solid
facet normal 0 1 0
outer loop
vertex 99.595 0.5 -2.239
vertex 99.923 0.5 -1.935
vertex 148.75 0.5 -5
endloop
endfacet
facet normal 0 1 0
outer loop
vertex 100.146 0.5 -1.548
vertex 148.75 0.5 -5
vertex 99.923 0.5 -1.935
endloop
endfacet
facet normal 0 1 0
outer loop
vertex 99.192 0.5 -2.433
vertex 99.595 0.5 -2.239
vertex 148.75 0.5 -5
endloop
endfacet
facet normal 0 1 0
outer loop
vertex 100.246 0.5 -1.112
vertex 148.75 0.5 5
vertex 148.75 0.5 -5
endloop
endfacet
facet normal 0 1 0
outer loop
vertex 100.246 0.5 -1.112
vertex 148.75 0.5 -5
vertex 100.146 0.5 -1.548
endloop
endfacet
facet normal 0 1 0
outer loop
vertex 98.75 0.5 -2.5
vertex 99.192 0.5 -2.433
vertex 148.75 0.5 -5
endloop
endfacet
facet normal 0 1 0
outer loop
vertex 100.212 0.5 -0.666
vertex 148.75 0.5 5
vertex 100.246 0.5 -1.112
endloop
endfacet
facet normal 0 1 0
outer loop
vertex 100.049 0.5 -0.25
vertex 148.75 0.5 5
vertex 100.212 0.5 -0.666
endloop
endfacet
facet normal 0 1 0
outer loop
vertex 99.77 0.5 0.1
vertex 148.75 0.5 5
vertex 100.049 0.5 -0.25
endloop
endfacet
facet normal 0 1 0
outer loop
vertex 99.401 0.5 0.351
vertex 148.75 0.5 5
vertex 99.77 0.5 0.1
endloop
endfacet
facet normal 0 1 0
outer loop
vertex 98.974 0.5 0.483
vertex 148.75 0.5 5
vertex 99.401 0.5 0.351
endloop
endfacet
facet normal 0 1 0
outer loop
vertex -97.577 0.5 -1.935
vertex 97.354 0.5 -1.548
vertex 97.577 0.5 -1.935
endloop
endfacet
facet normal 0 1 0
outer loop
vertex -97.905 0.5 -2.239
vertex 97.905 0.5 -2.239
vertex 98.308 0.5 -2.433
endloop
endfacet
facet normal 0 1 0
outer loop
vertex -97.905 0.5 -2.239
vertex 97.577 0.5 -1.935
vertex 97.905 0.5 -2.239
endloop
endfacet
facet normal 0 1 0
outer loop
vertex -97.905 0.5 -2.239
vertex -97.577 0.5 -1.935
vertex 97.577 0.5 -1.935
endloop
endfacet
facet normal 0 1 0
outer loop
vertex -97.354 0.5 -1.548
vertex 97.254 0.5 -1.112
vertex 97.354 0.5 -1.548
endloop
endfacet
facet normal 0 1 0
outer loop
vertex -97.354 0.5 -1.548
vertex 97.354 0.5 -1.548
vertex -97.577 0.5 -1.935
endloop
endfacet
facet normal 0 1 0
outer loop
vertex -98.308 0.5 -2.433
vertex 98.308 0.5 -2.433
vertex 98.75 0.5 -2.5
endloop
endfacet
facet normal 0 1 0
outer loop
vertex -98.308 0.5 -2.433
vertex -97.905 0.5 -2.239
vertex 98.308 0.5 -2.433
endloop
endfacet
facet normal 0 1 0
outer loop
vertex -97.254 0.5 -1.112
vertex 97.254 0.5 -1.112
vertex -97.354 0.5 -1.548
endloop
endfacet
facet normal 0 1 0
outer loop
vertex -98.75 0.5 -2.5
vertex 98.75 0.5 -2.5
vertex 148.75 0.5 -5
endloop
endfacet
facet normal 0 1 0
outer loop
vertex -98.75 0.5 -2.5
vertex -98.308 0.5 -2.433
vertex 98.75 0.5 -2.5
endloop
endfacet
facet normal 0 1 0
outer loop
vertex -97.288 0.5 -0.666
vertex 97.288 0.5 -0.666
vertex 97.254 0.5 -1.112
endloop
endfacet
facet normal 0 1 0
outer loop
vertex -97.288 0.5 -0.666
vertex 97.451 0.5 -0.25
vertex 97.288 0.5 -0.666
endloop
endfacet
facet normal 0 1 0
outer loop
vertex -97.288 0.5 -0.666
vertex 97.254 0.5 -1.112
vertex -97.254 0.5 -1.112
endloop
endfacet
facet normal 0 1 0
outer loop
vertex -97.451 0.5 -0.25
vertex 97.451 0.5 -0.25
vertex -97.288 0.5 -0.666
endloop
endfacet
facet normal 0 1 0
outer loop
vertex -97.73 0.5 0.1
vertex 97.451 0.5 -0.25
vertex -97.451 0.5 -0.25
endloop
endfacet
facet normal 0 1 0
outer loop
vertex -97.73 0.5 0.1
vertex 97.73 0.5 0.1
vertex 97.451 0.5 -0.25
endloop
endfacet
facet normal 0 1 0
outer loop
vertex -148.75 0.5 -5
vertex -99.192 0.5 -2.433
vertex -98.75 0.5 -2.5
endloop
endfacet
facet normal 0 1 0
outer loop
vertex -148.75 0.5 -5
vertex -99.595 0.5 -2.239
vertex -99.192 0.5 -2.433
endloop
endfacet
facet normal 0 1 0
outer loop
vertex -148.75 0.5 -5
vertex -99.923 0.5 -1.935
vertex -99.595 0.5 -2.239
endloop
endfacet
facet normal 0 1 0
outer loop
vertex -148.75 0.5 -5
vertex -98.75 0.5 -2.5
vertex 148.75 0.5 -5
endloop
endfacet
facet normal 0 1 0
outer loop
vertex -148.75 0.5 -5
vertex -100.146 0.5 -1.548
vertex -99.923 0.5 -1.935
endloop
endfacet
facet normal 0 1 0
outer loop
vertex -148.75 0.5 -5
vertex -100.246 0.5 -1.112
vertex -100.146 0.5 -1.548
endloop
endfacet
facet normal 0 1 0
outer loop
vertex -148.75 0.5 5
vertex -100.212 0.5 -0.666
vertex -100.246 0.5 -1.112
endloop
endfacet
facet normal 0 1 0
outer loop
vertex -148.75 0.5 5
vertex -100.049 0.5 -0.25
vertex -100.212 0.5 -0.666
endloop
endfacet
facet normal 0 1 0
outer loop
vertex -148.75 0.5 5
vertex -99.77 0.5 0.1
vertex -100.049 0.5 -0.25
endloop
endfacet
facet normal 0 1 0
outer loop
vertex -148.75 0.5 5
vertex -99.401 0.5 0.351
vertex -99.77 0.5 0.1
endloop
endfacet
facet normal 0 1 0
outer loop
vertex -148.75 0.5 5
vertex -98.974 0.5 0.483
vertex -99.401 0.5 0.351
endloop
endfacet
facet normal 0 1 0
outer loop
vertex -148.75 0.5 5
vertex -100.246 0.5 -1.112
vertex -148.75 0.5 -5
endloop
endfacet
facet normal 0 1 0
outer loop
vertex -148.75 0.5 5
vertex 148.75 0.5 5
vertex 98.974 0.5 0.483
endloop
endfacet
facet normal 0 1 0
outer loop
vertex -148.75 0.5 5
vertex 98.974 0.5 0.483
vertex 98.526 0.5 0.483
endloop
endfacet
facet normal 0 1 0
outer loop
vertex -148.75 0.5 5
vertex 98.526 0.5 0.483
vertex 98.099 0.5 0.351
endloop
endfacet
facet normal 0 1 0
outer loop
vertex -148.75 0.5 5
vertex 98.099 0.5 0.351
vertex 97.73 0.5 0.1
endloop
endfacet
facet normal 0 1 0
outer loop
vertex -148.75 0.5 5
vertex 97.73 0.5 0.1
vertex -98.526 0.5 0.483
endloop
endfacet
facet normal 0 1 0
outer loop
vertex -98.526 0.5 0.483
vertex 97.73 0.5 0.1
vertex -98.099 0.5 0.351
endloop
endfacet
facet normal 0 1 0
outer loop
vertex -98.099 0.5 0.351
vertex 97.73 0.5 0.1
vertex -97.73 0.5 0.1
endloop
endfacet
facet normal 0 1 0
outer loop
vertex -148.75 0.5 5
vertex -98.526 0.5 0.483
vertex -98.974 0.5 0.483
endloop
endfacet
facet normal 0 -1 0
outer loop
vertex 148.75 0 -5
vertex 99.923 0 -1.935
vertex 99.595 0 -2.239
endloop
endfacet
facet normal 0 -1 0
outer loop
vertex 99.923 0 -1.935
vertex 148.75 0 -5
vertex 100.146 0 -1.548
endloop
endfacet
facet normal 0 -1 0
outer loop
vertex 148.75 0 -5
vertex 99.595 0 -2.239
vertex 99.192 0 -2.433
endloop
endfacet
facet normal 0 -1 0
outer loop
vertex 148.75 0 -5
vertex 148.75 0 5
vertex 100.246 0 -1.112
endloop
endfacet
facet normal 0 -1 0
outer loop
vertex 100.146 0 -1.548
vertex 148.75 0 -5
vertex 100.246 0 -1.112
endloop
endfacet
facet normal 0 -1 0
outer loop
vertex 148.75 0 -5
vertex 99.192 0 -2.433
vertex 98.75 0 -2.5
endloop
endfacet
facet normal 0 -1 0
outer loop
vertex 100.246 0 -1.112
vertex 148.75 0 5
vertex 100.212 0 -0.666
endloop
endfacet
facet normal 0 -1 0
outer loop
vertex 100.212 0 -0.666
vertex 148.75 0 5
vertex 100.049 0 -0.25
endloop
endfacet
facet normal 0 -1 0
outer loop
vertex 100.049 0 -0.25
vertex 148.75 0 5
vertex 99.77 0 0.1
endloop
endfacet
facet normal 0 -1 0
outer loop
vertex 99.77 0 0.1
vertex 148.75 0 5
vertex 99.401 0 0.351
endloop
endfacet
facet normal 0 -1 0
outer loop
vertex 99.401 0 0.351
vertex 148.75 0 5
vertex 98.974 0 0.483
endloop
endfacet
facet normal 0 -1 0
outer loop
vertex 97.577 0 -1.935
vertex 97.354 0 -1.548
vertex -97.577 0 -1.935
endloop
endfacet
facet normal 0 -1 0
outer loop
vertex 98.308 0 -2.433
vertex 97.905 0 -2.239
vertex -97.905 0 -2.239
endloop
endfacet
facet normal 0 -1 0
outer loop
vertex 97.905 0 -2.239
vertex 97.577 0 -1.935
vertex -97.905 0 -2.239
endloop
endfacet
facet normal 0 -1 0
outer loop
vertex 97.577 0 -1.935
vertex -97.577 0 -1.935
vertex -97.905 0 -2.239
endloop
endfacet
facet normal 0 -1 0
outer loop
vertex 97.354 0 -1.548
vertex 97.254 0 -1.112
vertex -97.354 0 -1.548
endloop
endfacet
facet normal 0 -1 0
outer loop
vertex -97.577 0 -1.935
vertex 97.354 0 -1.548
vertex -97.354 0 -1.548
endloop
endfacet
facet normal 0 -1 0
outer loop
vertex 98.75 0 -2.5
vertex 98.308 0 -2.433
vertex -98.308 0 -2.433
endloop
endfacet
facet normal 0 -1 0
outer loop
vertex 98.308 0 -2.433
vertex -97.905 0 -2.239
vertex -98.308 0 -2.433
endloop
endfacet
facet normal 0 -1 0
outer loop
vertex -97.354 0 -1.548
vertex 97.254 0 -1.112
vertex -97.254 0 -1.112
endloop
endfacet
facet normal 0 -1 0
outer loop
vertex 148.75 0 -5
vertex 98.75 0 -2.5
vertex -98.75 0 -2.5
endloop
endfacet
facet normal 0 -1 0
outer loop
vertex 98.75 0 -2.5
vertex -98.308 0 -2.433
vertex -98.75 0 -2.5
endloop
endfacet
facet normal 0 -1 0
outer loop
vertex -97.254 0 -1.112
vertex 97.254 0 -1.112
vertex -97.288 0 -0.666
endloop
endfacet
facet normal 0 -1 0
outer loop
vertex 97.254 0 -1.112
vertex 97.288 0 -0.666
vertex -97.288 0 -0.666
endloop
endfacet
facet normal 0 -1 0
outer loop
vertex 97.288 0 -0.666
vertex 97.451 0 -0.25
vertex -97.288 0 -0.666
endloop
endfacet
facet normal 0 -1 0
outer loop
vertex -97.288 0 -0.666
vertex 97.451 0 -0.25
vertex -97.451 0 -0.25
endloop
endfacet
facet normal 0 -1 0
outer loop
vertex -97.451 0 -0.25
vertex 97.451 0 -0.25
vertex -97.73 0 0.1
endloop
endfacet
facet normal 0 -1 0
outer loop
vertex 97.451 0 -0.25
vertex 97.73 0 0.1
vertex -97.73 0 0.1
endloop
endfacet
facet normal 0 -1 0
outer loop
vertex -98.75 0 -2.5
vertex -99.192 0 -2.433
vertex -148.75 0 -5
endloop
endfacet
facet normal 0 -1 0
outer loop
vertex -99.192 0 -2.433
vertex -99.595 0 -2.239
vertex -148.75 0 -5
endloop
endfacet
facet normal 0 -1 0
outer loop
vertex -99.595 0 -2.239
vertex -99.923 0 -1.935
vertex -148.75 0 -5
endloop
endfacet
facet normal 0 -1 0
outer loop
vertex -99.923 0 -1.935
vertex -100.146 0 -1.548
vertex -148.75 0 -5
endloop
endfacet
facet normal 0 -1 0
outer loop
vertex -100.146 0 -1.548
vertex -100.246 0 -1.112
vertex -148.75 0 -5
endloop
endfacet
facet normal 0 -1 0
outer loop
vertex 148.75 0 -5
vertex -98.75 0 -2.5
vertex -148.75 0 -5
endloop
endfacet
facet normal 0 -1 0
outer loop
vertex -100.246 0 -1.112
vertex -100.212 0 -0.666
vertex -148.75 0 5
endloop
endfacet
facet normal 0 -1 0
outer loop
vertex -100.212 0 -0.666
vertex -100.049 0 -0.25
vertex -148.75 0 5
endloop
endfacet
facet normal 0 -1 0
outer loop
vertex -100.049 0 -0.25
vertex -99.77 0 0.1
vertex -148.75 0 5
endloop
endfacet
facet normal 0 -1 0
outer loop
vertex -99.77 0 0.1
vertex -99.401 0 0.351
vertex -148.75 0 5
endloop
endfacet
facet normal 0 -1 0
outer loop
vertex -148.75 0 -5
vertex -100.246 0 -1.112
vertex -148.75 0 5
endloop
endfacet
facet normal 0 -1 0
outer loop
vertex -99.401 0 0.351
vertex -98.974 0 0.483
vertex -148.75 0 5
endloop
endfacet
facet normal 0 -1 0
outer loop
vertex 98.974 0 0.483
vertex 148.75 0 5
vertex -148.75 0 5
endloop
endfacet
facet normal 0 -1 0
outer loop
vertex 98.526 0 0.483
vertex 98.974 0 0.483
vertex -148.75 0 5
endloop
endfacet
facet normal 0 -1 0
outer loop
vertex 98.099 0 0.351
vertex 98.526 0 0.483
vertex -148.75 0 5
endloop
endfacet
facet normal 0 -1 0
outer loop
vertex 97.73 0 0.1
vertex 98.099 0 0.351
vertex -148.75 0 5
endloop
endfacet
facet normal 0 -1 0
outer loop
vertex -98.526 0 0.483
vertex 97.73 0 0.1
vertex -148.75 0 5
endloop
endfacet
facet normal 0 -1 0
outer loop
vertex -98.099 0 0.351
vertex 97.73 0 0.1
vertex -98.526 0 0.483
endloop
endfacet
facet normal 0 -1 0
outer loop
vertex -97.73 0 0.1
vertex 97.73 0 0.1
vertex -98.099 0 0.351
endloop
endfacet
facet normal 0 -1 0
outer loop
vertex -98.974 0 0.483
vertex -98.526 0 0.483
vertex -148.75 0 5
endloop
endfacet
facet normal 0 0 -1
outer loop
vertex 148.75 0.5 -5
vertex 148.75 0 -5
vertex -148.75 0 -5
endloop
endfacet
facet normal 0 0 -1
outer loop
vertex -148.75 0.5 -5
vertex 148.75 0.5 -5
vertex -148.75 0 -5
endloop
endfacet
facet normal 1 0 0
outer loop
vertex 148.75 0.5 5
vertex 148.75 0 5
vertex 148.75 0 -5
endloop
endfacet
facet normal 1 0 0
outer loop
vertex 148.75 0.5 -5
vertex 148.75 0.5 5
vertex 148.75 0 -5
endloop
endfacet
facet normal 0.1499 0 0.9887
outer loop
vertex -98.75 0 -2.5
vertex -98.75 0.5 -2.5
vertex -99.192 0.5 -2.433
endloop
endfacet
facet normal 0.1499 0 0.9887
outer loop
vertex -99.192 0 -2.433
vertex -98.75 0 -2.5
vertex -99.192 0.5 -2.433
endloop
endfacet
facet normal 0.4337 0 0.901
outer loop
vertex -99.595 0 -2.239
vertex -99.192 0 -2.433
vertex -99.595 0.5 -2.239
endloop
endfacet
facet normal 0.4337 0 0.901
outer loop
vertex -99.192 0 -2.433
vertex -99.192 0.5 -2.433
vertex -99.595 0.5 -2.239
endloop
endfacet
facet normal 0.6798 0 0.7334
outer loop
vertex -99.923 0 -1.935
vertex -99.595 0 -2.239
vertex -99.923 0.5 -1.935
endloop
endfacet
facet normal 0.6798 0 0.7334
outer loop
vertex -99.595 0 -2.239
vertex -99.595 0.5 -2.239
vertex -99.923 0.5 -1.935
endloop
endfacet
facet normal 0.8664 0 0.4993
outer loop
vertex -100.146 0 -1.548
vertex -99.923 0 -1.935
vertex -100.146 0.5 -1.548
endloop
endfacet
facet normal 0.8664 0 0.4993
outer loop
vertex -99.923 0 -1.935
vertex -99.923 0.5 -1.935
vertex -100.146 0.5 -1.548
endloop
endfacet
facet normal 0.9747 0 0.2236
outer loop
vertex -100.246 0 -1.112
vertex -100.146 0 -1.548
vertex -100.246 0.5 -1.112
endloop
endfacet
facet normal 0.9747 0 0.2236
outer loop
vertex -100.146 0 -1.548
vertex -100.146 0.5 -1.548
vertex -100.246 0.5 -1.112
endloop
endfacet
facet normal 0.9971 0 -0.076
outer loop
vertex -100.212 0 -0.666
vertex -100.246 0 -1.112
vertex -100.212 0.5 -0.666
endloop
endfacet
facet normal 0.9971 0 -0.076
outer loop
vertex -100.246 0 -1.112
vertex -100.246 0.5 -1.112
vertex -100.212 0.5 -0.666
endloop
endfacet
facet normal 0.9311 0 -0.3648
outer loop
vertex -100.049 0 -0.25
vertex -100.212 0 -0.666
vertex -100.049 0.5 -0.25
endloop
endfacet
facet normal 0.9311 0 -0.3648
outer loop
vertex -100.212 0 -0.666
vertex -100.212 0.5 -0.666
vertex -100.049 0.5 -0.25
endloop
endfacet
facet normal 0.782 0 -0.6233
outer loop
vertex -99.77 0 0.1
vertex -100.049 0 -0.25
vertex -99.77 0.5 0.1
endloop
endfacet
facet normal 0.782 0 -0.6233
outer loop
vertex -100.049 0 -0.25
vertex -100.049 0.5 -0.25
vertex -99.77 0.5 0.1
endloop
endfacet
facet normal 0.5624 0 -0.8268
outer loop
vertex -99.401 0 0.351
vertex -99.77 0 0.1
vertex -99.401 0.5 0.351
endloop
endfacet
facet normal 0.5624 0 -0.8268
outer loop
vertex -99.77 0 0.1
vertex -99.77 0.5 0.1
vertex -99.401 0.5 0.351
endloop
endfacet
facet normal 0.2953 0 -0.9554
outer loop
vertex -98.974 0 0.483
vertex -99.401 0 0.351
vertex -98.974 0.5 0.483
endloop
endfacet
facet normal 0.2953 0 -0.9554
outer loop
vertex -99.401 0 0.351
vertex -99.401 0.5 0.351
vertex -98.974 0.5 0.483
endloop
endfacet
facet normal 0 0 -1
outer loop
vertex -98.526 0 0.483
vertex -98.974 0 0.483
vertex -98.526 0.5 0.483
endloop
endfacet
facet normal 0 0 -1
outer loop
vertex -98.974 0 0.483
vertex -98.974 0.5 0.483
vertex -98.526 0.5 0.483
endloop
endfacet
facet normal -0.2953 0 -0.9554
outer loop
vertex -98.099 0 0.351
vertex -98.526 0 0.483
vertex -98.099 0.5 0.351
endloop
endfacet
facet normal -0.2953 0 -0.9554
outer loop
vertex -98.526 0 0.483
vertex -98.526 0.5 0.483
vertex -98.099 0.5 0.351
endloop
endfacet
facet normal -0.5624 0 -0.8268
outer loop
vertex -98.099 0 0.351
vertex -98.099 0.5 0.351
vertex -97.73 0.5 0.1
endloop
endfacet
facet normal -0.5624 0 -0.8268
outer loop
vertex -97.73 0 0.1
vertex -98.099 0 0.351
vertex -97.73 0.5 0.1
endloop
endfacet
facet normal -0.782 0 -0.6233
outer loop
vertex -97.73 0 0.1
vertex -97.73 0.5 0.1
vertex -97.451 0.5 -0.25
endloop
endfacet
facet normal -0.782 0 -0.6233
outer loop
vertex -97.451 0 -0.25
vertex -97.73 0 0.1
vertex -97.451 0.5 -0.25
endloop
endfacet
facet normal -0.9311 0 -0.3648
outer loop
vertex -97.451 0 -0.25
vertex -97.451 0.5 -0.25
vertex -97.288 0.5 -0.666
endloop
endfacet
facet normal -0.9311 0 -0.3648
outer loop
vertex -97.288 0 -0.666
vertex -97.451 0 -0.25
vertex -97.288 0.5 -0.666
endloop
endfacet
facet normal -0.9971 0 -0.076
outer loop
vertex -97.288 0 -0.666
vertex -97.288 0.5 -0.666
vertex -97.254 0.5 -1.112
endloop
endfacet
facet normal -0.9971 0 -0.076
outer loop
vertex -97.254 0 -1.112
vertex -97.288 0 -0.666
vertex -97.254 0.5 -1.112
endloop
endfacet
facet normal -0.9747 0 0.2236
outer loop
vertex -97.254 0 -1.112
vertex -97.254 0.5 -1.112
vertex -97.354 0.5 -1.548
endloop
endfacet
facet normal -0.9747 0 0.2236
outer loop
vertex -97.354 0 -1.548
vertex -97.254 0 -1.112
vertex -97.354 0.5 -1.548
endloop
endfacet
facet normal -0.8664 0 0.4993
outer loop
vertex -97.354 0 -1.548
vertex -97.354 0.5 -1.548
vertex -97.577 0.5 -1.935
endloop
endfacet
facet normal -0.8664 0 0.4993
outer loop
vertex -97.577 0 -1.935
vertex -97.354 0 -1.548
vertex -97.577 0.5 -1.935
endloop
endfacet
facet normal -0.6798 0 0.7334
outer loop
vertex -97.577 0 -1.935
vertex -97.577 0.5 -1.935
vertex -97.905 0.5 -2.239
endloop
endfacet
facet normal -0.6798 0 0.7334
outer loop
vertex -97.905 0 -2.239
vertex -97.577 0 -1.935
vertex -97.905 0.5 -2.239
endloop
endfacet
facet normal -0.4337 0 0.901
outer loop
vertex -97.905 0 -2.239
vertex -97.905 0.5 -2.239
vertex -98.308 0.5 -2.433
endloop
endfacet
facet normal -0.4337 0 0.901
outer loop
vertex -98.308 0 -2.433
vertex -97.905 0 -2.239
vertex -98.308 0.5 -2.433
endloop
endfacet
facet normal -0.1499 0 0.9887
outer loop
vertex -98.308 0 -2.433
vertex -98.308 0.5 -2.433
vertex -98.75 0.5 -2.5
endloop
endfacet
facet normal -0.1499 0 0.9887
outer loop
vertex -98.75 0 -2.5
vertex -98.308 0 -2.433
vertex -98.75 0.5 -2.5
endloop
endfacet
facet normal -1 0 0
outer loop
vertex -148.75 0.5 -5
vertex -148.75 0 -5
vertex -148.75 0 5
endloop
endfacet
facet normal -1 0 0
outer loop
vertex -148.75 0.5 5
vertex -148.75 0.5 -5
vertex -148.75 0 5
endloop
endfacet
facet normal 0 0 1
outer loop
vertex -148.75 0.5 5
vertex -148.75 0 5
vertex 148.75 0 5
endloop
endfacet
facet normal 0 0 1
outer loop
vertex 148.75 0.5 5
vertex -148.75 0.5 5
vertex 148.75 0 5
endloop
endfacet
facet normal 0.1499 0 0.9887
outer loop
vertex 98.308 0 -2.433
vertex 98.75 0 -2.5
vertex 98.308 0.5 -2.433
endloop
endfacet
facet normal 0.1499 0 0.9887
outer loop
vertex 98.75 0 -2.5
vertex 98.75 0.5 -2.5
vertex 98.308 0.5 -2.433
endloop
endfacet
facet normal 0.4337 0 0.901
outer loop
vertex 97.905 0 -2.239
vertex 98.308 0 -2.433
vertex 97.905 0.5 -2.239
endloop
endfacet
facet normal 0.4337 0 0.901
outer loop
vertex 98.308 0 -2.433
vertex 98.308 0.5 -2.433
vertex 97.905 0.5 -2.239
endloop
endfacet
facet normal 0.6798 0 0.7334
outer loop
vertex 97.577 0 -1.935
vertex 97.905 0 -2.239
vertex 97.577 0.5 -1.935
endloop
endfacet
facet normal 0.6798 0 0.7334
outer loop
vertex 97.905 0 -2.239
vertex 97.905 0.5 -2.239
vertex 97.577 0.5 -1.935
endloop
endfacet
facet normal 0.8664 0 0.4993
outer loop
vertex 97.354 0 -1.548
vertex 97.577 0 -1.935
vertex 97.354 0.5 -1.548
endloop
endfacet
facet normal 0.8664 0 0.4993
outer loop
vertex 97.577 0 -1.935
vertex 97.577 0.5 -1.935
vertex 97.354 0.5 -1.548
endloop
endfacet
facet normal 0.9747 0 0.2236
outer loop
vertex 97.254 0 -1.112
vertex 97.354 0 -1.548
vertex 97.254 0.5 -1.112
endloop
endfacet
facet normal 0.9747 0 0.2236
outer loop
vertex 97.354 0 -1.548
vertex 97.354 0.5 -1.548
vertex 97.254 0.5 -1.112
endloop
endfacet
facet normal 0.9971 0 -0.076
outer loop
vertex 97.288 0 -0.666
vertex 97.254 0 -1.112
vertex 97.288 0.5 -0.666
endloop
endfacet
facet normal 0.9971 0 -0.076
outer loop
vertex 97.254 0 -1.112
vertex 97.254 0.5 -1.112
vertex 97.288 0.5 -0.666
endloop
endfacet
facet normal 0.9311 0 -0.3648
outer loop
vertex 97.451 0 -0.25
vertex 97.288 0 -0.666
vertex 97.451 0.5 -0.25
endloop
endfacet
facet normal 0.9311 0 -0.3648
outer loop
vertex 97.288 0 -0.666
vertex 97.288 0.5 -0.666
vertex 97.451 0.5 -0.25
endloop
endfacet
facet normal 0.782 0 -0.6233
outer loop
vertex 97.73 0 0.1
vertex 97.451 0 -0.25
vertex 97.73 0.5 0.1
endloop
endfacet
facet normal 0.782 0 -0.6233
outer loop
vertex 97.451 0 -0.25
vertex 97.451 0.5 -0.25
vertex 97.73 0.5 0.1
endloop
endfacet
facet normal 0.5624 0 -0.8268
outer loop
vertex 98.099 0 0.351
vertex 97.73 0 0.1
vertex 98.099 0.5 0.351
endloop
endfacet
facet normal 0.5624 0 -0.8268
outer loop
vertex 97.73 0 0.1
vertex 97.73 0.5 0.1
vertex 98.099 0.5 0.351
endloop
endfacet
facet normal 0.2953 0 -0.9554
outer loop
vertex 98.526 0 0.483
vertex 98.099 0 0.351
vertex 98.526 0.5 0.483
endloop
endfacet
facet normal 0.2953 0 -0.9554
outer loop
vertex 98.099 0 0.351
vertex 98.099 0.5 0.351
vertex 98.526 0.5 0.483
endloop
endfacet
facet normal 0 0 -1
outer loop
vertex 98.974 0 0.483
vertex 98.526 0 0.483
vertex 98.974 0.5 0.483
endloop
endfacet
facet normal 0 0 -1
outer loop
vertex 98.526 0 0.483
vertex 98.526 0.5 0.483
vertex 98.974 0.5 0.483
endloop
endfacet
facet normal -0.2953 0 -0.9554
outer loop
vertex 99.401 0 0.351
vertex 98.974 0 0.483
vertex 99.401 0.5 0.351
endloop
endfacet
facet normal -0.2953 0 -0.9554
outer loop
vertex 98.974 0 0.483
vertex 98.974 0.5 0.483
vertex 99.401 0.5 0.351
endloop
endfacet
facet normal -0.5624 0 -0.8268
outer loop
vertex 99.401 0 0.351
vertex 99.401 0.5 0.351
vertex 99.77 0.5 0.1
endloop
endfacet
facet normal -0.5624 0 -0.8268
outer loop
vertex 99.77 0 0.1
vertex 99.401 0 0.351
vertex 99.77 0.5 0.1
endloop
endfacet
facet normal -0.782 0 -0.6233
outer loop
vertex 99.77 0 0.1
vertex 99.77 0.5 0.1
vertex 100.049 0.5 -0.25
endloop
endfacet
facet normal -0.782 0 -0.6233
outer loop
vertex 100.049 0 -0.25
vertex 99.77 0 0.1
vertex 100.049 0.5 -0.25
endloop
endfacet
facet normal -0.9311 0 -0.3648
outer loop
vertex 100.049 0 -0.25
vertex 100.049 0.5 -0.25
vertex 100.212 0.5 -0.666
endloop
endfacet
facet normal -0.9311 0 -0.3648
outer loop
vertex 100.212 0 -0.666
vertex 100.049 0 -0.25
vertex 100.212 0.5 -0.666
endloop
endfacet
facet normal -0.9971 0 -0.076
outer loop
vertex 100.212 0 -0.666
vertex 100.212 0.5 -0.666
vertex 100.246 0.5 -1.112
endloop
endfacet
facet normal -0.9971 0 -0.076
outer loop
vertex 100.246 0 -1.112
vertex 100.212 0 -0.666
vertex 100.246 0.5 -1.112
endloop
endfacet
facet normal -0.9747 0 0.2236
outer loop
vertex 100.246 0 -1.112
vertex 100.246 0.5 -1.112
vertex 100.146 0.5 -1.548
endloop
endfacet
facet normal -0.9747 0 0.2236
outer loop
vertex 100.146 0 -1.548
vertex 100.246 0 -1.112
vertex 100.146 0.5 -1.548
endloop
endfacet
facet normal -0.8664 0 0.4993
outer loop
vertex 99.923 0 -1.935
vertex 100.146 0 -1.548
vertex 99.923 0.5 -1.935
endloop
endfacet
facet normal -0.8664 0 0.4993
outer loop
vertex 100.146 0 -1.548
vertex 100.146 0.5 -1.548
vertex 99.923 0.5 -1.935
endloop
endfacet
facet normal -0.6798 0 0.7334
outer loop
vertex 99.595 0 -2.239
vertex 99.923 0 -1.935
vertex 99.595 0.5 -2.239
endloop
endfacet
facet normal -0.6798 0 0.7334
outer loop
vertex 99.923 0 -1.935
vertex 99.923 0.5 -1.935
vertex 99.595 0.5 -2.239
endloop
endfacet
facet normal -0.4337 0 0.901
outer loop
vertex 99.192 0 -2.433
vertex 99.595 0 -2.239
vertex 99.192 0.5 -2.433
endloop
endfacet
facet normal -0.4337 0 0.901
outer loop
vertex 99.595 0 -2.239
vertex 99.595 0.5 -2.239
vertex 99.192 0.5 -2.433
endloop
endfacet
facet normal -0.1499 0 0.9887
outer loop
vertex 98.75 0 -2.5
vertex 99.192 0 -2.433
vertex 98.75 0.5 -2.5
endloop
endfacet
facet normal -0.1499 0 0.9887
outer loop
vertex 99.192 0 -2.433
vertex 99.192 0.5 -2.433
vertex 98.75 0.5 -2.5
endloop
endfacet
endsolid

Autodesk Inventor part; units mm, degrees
ref_plane "YZ Plane" through (0, 0, 0) normal (1, 0, 0) x (0, 1, 0)
ref_plane "XZ Plane" through (0, 0, 0) normal (0, 1, 0) x (-1, 0, 0)
ref_plane "XY Plane" through (0, 0, 0) normal (0, 0, 1) x (1, 0, 0)
sketch "Esboço1" plane through (0, 0, 0) normal (0, 1, 0) x (-1, 0, 0)
  line L0 (148.75, 5) -> (-148.75, 5)
  line L1 (-148.75, 5) -> (-148.75, -5)
  line L2 (-148.75, -5) -> (148.75, -5)
  line L3 (148.75, -5) -> (148.75, 5)
  line L4 (148.75, 5) -> (-148.75, -5) construction
  line L5 (-148.75, 5) -> (148.75, -5) construction
  point P0 (0, 0)
  dimension "d0" = 297.5
  dimension "d1" = 10
extrude "Placa1" add sketch "Esboço1" along normal blind 0.5
sketch "Esboço2" plane through (0, 0, 0) normal (0, -1, 0) x (1, 0, 0)
  line L0 (-148.75, -5) -> (-148.75, 5) projected
  line L1 (148.75, -5) -> (-148.75, -5) projected
  line L2 (148.75, 5) -> (148.75, -5) projected
  point P0 (0, 0)
  point P1 (-98.75, -1)
  point P2 (98.75, -1)
  dimension "d3" = 50
  dimension "d4" = 4
  dimension "d5" = 4
  dimension "d6" = 50
hole "Furo1" at (-98.75, 0, -1) at (98.75, 0, -1) direction (0, 1, 0) diameter 3 end through all
equation "\"d12\" = Espessura"
equation "\"d2\" = Espessura"
equation "\"Raio_vergadura\" = Espessura"
equation "\"Largura_alívio_de_vergadura\" = Espessura"
equation "\"Profundidade_alívio_de_vergadura\" = 0.5 * Espessura"
equation "\"Tamanho_alívio_de_dobra\" = 4 * Espessura"
equation "\"Remanescente_mínimo\" = 2 * Espessura"
equation "\"Raiodetransição\" = Raio_vergadura"
equation "\"Tamanho_de_raio_de_Jacobi\" = Raio_vergadura"
equation "\"TamanhoFolga\" = Espessura"
equation "\"Espessura\" = 0.5"
properties part number "Lateral 1 Gaveta" material "PMMA plástico"
